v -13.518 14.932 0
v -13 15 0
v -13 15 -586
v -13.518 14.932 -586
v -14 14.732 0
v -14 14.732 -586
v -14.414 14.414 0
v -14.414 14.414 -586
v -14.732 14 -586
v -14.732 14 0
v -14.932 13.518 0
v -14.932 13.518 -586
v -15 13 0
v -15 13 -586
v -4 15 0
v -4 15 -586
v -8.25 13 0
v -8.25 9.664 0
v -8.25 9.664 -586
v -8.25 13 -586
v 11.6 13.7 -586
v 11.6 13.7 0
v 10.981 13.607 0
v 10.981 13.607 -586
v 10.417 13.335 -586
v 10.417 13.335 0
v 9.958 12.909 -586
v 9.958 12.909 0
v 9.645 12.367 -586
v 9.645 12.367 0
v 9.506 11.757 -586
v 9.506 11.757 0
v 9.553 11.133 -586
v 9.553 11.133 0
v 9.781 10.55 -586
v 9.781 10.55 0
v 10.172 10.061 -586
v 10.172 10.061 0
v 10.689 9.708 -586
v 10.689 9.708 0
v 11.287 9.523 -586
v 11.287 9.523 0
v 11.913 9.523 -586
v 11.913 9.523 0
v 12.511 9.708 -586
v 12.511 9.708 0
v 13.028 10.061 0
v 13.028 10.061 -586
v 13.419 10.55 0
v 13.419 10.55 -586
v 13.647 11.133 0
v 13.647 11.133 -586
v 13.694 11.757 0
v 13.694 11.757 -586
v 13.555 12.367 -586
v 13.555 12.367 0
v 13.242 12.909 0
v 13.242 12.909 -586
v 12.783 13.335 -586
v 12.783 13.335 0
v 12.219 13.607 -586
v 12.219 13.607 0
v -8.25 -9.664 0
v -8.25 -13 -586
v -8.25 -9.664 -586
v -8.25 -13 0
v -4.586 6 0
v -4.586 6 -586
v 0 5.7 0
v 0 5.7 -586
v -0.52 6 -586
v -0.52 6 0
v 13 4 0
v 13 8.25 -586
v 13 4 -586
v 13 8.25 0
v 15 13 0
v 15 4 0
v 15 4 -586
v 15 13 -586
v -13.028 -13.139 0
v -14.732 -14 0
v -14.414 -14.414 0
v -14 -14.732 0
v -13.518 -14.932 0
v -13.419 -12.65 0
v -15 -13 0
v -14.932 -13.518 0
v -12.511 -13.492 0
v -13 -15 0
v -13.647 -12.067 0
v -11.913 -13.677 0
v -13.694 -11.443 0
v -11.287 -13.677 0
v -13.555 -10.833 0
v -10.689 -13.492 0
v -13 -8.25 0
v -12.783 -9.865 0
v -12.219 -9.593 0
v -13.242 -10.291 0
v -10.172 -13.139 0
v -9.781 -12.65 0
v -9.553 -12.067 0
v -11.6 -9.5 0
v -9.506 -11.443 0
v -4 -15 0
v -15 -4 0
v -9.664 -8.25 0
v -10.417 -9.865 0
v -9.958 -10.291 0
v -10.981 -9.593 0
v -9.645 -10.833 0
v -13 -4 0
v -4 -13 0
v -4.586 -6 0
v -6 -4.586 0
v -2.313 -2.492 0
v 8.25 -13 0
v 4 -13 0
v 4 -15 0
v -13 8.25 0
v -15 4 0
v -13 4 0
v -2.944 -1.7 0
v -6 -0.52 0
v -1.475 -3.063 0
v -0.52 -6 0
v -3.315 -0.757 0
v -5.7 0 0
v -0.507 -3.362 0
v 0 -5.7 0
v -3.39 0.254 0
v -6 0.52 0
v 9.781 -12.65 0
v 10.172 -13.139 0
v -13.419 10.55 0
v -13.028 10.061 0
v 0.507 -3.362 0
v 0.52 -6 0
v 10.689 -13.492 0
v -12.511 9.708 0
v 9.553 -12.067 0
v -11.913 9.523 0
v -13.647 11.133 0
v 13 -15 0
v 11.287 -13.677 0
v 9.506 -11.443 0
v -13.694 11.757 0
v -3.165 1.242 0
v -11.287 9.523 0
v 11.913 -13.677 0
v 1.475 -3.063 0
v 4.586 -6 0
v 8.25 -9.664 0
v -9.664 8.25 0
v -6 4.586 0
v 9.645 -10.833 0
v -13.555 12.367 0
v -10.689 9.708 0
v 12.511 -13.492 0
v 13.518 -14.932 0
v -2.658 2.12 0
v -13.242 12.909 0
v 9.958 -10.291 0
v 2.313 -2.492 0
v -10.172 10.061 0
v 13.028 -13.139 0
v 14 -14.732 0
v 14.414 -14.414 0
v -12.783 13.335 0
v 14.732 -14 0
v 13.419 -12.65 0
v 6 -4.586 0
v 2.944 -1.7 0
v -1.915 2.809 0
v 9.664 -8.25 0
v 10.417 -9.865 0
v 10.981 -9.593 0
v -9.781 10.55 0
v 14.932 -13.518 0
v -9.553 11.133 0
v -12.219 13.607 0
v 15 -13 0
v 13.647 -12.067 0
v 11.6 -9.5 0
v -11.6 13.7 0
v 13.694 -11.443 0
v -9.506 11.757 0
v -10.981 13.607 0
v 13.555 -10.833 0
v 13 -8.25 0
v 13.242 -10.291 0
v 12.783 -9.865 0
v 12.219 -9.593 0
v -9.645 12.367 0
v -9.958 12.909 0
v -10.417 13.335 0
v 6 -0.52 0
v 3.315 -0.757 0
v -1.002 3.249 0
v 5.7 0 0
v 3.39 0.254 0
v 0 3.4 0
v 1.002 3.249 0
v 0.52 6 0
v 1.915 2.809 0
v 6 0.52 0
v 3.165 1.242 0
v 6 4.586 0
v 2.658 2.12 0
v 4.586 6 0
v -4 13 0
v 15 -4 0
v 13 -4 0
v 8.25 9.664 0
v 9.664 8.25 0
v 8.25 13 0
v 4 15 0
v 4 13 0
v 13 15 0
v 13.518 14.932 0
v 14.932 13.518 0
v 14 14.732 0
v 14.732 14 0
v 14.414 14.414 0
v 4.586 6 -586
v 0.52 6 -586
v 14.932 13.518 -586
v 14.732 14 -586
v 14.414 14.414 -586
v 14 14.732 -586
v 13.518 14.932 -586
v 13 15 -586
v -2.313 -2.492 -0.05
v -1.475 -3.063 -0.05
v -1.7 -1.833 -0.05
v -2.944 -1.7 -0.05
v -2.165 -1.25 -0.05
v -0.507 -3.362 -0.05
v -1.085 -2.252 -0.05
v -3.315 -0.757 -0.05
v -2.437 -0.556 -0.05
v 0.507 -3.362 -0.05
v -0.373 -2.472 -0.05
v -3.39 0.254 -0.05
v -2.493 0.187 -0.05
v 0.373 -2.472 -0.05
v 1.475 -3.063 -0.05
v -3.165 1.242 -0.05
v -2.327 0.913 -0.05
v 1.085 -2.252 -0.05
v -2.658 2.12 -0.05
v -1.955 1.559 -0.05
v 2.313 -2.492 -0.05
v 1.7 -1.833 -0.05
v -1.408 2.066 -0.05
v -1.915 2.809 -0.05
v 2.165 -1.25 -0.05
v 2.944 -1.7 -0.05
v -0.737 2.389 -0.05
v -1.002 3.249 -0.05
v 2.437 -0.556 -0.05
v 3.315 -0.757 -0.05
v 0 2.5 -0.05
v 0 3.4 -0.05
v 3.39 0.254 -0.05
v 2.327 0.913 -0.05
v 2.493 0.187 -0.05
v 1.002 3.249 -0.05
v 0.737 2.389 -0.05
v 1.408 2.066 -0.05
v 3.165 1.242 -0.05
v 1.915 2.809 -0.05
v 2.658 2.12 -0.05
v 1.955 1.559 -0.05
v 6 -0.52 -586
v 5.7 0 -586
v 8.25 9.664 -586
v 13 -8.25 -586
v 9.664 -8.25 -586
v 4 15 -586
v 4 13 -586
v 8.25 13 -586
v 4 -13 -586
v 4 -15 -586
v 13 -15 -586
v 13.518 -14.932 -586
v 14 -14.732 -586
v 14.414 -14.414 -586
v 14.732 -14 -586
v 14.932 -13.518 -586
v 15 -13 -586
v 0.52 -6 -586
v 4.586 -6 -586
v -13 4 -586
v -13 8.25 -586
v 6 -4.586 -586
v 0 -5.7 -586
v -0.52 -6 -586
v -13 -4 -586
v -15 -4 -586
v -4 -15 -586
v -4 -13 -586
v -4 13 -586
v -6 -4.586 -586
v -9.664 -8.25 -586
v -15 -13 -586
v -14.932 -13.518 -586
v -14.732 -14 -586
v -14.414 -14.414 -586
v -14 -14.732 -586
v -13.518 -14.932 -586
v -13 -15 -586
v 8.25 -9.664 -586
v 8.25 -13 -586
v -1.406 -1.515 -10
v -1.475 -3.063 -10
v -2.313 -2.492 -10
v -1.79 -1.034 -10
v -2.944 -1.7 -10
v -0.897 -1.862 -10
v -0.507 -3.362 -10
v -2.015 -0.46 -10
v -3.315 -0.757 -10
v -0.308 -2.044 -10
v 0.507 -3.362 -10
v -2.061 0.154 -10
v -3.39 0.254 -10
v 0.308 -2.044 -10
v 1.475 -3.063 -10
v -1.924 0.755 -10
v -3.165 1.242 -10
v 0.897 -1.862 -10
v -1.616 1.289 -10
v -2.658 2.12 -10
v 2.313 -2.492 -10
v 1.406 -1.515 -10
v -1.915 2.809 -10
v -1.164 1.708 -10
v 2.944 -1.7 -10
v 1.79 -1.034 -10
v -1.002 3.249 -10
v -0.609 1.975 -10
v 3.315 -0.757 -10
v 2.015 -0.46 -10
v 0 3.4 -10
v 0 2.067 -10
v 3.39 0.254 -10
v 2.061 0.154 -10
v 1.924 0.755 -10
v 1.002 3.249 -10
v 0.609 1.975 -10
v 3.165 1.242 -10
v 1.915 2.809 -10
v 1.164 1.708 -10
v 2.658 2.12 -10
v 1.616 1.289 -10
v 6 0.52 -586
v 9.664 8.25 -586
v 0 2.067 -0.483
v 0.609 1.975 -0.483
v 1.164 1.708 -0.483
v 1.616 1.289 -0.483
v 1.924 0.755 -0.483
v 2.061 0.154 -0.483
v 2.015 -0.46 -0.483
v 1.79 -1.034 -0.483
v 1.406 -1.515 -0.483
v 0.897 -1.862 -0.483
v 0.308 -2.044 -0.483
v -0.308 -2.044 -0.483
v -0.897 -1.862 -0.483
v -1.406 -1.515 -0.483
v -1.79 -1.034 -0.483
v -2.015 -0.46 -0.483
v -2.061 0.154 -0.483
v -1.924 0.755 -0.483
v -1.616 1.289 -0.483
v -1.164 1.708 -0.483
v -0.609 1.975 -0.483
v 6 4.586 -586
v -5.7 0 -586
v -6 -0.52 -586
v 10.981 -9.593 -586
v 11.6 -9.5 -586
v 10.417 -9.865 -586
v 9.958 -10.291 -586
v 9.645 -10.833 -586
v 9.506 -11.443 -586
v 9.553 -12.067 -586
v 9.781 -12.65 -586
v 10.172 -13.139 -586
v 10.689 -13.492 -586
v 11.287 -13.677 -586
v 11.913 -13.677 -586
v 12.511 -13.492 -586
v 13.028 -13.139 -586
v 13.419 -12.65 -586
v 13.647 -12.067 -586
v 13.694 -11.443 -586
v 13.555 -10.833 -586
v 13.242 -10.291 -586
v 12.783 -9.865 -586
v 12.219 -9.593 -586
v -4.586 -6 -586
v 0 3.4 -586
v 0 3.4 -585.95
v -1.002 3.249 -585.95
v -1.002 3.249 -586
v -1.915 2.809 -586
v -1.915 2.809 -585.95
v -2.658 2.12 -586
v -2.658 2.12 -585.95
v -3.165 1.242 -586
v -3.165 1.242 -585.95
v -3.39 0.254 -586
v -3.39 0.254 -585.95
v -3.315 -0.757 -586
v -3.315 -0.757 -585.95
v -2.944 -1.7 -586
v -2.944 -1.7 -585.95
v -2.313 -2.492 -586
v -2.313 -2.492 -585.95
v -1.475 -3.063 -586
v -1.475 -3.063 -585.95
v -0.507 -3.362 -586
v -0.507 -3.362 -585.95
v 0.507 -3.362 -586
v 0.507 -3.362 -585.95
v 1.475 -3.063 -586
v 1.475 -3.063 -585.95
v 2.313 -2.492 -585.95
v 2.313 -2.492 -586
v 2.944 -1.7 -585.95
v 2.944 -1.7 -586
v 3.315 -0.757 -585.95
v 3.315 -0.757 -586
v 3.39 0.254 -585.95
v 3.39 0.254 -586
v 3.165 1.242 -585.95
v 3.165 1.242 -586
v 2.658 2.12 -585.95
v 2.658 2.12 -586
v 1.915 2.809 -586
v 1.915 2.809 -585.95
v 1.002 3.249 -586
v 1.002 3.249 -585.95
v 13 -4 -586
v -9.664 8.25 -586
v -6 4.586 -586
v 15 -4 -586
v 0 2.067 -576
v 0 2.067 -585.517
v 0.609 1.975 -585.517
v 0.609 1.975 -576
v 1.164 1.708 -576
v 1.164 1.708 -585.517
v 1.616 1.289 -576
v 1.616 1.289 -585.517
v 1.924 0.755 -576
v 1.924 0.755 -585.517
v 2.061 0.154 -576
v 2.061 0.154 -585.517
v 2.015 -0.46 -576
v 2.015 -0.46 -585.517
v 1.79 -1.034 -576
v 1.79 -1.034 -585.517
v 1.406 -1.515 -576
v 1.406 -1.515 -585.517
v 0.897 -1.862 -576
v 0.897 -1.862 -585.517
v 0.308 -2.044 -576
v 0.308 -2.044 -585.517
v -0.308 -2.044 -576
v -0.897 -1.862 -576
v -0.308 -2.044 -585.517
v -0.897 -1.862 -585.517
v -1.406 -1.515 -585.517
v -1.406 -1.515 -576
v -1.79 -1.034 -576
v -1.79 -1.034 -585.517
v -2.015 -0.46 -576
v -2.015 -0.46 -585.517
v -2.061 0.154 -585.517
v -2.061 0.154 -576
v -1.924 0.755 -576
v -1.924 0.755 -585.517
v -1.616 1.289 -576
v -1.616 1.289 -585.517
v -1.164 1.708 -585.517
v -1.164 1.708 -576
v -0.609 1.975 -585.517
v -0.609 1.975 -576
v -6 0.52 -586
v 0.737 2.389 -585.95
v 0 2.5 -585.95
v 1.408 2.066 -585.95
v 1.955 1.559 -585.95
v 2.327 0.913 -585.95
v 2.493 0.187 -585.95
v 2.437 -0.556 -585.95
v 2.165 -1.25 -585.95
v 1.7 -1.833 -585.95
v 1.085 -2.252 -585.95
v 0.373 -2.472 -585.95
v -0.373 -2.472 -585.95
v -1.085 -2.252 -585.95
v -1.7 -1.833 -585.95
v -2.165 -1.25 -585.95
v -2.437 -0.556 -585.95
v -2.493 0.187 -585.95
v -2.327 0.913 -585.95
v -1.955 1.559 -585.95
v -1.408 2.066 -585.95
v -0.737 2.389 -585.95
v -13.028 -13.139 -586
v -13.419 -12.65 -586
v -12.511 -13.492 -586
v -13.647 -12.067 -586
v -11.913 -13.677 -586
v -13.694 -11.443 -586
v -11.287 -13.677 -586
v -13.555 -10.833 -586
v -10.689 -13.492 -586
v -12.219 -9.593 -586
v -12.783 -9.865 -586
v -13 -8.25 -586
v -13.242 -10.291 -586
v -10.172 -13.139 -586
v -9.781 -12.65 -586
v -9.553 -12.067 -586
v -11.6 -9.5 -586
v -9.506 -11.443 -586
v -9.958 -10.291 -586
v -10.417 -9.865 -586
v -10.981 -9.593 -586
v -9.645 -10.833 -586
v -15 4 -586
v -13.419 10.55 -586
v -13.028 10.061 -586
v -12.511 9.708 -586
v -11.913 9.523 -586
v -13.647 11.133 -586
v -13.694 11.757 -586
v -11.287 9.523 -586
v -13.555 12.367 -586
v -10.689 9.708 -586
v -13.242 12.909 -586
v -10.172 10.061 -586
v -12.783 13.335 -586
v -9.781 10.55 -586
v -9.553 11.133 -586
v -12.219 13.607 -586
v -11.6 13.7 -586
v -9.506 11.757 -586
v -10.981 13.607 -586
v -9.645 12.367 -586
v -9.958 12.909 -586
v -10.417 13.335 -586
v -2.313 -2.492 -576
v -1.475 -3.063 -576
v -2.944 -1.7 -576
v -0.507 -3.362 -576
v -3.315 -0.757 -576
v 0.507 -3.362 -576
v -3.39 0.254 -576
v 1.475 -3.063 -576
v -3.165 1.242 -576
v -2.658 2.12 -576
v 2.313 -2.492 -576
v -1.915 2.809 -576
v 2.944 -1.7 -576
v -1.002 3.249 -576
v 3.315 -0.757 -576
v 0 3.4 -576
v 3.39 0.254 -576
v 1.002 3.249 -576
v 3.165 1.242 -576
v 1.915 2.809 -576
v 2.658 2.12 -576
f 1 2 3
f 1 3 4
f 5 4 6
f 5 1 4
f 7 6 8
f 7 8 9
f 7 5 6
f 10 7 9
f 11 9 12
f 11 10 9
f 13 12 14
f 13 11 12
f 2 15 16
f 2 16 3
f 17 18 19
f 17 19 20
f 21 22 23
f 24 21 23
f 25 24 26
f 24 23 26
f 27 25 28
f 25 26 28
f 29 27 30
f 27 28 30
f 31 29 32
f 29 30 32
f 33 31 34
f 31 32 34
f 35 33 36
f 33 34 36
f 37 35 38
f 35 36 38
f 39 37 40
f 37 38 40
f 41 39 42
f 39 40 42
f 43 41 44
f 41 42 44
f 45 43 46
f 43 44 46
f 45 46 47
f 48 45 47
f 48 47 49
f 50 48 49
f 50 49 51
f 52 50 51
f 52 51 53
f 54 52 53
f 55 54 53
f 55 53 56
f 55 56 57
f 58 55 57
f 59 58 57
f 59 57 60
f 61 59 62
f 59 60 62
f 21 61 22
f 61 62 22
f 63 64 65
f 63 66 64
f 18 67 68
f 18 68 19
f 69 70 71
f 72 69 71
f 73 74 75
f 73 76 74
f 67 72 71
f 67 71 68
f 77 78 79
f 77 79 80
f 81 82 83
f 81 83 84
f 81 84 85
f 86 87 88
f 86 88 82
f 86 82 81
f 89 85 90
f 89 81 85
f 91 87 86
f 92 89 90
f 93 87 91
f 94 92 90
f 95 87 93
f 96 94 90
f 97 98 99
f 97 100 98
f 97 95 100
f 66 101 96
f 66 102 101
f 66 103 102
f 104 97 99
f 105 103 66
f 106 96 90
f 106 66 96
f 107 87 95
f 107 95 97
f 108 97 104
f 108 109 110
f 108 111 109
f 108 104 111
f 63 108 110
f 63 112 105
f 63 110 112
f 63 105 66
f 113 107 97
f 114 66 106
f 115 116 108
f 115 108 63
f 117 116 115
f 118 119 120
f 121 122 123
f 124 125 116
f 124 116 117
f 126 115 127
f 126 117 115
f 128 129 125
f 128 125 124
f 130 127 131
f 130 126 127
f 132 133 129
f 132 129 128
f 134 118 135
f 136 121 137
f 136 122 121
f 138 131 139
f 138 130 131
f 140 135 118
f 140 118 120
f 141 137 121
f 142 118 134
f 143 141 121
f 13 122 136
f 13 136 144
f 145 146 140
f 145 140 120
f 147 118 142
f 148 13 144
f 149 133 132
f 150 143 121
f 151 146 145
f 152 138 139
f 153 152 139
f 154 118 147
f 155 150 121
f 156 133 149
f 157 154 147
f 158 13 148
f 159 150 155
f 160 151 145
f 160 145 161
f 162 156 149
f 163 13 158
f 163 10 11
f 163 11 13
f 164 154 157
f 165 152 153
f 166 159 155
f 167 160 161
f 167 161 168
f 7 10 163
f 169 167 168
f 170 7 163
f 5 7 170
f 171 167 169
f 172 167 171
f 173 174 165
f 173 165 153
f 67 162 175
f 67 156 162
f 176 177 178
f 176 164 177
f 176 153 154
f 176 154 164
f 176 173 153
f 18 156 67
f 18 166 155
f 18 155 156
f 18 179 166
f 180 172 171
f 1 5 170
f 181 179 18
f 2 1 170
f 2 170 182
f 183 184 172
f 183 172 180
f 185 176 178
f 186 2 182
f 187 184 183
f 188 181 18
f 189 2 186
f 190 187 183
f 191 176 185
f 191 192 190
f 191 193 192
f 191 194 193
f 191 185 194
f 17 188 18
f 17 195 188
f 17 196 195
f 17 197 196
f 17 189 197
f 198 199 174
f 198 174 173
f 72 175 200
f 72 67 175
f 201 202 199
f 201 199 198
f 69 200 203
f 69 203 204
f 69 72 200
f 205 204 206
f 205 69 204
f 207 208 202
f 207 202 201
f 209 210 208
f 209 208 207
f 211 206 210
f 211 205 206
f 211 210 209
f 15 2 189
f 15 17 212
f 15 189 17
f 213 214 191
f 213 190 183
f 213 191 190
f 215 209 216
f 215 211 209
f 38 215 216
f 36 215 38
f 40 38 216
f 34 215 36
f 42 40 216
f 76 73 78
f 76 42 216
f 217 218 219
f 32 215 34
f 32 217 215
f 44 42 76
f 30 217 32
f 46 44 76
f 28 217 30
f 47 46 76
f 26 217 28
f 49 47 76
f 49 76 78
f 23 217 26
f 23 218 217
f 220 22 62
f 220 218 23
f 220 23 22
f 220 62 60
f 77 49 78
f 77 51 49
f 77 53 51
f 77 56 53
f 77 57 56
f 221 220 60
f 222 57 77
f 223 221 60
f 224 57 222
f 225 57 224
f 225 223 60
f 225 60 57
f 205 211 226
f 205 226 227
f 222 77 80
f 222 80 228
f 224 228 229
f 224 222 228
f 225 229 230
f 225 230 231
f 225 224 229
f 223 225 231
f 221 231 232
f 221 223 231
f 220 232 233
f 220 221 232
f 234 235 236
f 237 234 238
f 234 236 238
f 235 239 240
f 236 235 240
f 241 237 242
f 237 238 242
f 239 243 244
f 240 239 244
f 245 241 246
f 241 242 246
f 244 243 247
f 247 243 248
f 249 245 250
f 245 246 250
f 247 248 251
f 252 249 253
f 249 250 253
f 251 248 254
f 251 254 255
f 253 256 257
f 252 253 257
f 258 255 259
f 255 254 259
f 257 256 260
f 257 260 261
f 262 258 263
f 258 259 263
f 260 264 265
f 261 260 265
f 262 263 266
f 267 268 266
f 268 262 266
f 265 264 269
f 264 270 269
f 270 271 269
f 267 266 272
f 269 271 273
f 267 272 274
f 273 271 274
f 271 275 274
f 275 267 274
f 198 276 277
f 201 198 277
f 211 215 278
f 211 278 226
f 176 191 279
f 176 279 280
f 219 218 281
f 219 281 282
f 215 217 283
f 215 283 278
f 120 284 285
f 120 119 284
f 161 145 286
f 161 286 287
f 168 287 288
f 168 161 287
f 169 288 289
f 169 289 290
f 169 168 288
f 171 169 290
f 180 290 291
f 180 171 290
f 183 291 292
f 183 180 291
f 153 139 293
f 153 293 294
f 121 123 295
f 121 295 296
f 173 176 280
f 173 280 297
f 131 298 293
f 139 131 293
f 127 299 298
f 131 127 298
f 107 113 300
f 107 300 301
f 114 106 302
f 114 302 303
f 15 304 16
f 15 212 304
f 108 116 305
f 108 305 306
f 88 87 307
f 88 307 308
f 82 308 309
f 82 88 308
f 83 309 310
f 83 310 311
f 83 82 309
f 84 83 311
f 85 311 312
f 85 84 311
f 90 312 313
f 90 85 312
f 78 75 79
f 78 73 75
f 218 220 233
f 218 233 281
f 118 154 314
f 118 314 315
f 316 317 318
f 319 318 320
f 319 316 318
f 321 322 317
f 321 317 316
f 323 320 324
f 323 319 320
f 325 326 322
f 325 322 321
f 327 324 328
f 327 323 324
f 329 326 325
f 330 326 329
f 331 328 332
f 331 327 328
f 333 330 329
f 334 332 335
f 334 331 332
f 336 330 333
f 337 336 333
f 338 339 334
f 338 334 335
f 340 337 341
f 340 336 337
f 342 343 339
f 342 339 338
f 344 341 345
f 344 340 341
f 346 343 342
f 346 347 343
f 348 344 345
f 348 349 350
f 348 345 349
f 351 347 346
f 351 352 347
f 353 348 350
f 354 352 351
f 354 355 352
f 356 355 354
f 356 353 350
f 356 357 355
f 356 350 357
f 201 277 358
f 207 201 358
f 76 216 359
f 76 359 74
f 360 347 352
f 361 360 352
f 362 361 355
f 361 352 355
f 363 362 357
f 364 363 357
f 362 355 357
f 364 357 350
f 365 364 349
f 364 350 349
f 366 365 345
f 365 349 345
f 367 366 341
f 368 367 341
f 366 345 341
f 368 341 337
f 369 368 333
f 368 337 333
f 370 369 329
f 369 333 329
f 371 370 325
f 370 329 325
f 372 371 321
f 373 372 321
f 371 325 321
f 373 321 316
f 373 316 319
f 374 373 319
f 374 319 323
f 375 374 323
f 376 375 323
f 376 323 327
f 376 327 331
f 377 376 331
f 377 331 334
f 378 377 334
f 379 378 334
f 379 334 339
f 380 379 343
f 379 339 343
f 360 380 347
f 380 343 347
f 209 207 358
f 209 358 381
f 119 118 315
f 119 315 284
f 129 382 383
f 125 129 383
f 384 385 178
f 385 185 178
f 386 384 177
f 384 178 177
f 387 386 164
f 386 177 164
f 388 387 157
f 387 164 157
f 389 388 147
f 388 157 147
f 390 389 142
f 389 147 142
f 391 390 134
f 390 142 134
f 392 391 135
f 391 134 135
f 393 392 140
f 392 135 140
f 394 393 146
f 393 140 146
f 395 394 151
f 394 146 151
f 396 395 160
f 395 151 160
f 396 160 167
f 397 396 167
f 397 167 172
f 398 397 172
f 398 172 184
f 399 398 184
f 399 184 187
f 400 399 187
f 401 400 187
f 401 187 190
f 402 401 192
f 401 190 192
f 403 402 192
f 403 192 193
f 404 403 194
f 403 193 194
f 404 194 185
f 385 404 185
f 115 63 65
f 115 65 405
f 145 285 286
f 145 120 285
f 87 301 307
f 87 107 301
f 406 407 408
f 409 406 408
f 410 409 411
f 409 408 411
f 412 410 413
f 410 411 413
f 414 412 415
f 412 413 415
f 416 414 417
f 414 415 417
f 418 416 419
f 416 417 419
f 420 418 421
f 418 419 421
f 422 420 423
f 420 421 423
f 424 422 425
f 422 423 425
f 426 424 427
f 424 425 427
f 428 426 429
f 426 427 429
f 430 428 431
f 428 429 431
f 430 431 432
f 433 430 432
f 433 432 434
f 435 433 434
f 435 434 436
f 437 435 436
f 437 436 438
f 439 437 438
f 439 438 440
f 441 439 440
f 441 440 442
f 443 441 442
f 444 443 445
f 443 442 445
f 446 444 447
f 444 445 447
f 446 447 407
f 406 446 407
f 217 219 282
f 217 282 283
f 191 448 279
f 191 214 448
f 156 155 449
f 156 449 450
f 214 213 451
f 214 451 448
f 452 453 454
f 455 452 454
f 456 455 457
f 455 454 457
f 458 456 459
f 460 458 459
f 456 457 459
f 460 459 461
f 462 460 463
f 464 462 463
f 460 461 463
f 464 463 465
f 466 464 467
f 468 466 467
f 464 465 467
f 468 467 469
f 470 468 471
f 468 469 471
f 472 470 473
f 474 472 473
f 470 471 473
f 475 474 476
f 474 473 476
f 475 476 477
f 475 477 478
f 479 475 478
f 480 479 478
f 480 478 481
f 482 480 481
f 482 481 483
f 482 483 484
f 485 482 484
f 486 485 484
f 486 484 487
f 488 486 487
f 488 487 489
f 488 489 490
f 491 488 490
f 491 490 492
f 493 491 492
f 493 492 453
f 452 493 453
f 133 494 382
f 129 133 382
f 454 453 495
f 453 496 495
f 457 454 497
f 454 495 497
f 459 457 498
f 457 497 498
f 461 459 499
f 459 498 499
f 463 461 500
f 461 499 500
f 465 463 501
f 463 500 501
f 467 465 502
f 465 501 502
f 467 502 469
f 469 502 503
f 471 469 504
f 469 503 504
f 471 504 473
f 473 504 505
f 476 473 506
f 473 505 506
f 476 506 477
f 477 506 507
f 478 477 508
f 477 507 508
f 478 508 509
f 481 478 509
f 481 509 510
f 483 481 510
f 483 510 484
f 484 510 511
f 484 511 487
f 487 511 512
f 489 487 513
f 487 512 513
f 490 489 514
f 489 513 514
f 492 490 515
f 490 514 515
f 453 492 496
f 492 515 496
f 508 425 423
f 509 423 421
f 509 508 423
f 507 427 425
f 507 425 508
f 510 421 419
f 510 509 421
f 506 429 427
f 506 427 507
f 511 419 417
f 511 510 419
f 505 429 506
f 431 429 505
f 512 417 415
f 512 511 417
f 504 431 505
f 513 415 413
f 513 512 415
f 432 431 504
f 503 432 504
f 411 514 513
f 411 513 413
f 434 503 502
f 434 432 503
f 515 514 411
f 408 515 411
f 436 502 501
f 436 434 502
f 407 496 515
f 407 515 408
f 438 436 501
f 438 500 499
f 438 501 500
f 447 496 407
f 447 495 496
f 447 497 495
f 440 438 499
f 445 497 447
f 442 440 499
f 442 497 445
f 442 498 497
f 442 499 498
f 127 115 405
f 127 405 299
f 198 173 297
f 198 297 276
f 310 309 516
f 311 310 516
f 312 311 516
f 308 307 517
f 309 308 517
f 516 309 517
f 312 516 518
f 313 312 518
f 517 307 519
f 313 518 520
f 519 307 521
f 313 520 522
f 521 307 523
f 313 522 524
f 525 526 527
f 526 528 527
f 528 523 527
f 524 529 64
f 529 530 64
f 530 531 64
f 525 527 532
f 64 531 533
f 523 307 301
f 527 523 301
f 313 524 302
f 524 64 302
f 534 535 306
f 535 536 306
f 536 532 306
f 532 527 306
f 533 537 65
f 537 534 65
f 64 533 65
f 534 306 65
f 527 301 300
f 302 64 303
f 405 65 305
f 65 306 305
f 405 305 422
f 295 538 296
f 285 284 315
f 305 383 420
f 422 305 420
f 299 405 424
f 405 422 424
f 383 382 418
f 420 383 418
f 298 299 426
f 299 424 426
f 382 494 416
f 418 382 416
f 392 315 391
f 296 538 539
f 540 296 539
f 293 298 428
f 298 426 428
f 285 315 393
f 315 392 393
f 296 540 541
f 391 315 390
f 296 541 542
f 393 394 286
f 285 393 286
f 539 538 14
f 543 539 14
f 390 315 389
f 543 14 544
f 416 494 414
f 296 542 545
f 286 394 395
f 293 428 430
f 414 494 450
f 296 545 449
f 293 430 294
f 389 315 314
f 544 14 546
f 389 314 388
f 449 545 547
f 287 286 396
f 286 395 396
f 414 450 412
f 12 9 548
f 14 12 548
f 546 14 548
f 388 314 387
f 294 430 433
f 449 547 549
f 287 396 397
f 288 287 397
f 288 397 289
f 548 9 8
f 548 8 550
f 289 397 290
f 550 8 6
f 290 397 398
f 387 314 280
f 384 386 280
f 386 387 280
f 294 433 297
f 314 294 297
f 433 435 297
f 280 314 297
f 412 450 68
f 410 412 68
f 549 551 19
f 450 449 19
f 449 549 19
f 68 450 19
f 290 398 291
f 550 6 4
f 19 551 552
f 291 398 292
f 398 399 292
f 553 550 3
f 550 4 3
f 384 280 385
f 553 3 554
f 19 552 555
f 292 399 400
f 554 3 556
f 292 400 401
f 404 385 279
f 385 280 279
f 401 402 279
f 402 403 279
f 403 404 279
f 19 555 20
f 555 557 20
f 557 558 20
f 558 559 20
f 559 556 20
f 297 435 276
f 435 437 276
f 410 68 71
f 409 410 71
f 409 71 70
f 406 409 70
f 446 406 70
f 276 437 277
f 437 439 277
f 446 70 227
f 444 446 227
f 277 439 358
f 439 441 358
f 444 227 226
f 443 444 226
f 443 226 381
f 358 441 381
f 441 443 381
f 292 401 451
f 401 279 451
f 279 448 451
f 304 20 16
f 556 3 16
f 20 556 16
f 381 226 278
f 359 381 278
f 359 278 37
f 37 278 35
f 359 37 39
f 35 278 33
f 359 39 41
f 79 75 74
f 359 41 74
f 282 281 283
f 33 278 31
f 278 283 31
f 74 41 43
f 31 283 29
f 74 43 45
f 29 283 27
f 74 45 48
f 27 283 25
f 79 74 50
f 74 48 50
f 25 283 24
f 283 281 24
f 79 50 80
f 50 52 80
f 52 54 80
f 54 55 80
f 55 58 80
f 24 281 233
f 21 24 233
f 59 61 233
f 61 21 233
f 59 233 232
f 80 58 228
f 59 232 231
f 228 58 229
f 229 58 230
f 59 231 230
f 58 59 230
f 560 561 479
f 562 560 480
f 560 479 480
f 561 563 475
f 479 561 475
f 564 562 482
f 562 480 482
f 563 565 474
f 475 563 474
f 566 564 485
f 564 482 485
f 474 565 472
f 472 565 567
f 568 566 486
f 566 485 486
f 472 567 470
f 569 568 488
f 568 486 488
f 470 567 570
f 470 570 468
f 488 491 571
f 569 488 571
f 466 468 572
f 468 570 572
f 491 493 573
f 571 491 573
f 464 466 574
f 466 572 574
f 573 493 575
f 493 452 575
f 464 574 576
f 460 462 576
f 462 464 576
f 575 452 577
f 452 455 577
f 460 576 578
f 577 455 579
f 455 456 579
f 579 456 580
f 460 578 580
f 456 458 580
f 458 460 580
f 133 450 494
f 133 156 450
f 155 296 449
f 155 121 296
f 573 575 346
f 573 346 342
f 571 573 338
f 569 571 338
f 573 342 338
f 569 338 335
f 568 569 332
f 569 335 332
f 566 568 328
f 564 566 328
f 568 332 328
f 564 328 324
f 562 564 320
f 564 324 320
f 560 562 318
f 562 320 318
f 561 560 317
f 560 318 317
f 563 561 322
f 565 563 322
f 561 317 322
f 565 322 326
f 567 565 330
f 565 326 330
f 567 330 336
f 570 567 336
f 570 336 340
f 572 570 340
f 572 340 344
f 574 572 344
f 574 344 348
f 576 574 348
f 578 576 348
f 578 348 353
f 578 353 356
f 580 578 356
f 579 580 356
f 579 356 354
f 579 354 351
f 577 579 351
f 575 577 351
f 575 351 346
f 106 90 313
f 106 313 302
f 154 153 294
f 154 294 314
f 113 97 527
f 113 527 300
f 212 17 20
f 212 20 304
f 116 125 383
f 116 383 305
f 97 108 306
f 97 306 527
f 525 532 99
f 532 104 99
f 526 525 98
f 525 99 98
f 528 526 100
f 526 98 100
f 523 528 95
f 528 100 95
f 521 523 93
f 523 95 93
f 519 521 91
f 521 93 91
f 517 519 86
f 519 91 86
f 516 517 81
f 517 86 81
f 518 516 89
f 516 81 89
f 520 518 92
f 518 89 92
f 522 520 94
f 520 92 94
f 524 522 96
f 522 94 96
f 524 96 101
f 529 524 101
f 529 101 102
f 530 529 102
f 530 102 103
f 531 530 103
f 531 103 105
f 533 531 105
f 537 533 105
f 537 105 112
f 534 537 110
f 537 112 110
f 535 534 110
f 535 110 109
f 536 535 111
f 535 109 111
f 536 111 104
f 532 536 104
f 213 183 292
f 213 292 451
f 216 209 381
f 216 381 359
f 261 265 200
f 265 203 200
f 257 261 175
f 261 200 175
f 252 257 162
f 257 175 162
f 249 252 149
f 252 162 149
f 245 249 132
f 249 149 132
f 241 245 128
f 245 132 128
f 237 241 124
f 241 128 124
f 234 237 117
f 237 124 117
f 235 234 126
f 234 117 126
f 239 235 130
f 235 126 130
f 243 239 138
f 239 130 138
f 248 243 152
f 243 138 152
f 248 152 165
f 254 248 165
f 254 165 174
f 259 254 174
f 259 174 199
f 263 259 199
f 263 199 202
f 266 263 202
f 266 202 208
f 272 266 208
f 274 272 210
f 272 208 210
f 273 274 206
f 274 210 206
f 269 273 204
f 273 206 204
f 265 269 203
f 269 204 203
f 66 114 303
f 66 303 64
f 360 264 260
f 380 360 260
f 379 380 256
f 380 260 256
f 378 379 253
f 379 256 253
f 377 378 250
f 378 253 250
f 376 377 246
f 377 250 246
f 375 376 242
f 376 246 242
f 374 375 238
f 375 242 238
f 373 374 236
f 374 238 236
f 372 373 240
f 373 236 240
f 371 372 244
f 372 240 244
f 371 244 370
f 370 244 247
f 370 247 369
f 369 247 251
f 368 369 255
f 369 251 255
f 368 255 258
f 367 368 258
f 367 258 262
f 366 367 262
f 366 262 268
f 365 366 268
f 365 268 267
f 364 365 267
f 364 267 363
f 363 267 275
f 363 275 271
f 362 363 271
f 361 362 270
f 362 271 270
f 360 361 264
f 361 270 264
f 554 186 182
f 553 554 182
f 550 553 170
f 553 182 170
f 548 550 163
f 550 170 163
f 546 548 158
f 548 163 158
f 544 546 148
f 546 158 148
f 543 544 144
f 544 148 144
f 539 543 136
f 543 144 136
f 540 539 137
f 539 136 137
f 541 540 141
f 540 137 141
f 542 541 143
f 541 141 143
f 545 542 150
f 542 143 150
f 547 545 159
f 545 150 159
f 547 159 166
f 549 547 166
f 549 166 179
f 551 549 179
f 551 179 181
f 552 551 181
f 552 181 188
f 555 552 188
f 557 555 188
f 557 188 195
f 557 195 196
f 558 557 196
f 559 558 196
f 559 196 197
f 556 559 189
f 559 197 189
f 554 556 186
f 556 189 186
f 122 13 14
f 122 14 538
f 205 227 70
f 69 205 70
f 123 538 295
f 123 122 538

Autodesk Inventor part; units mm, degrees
sketch "Sketch_1" plane through (0, 0, 0) normal (0, 0, 1) x (1, 0, 0)
  line L0 (-15, -4) -> (-15, -13)
  arc A0 (-15, -13) -> (-13, -15) centre (-13, -13) ccw
  line L1 (-13, -15) -> (-4, -15)
  line L2 (-4, -15) -> (-4, -13)
  line L3 (-4, -13) -> (-8.25, -13)
  line L4 (-8.25, -13) -> (-8.25, -9.6642)
  line L5 (-8.25, -9.6642) -> (-4.5858, -6)
  line L6 (-4.5858, -6) -> (-0.5196, -6)
  line L7 (-0.5196, -6) -> (0, -5.7)
  line L8 (0, -5.7) -> (0.5196, -6)
  line L9 (0.5196, -6) -> (4.5858, -6)
  line L10 (4.5858, -6) -> (8.25, -9.6642)
  line L11 (8.25, -9.6642) -> (8.25, -13)
  line L12 (8.25, -13) -> (4, -13)
  line L13 (4, -13) -> (4, -15)
  line L14 (4, -15) -> (13, -15)
  arc A1 (13, -15) -> (15, -13) centre (13, -13) ccw
  line L15 (15, -13) -> (15, -4)
  line L16 (15, -4) -> (13, -4)
  line L17 (13, -4) -> (13, -8.25)
  line L18 (13, -8.25) -> (9.6642, -8.25)
  line L19 (9.6642, -8.25) -> (6, -4.5858)
  line L20 (6, -4.5858) -> (6, -0.5196)
  line L21 (6, -0.5196) -> (5.7, 0)
  line L22 (5.7, 0) -> (6, 0.5196)
  line L23 (6, 0.5196) -> (6, 4.5858)
  line L24 (6, 4.5858) -> (9.6642, 8.25)
  line L25 (9.6642, 8.25) -> (13, 8.25)
  line L26 (13, 8.25) -> (13, 4)
  line L27 (13, 4) -> (15, 4)
  line L28 (15, 4) -> (15, 13)
  arc A2 (15, 13) -> (13, 15) centre (13, 13) ccw
  line L29 (13, 15) -> (4, 15)
  line L30 (4, 15) -> (4, 13)
  line L31 (4, 13) -> (8.25, 13)
  line L32 (8.25, 13) -> (8.25, 9.6642)
  line L33 (8.25, 9.6642) -> (4.5858, 6)
  line L34 (4.5858, 6) -> (0.5196, 6)
  line L35 (0.5196, 6) -> (0, 5.7)
  line L36 (0, 5.7) -> (-0.5196, 6)
  line L37 (-0.5196, 6) -> (-4.5858, 6)
  line L38 (-4.5858, 6) -> (-8.25, 9.6642)
  line L39 (-8.25, 9.6642) -> (-8.25, 13)
  line L40 (-8.25, 13) -> (-4, 13)
  line L41 (-4, 13) -> (-4, 15)
  line L42 (-4, 15) -> (-13, 15)
  arc A3 (-13, 15) -> (-15, 13) centre (-13, 13) ccw
  line L43 (-15, 13) -> (-15, 4)
  line L44 (-15, 4) -> (-13, 4)
  line L45 (-13, 4) -> (-13, 8.25)
  line L46 (-13, 8.25) -> (-9.6642, 8.25)
  line L47 (-9.6642, 8.25) -> (-6, 4.5858)
  line L48 (-6, 4.5858) -> (-6, 0.5196)
  line L49 (-6, 0.5196) -> (-5.7, 0)
  line L50 (-5.7, 0) -> (-6, -0.5196)
  line L51 (-6, -0.5196) -> (-6, -4.5858)
  line L52 (-6, -4.5858) -> (-9.6642, -8.25)
  line L53 (-9.6642, -8.25) -> (-13, -8.25)
  line L54 (-13, -8.25) -> (-13, -4)
  line L55 (-13, -4) -> (-15, -4)
extrude "Extrusion1" add sketch "Sketch_1" against normal blind 586
sketch "Sketch2" plane through (0, 0, -586) normal (0, 0, -1) x (-1, 0, 0)
  point P0 (0, 0)
hole "Hole1" at (0, 0, -586) direction (0, 0, 1) diameter 6.8 depth 586
sketch "Sketch3" plane through (0, 0, -586) normal (0, 0, -1) x (-1, 0, 0)
  point P0 (-11.6, 11.6)
hole "Hole2" at (11.6, 11.6, -586) direction (0, 0, 1) diameter 4.2 depth 586
pattern_linear "Rectangular Pattern1" count 2 spacing 23.2 along (-1, 0, 0) count 2 spacing 23.2 along (0, -1, 0) of "Hole2"
sketch "Sketch_41" plane through (0, 0, 0) normal (1, 0, 0) x (0, 0, -1)
  line L0 (10, 0) -> (0.05, 0)
  line L1 (0.05, 2.5) -> (0.483, 2.067)
  line L2 (0.483, 2.067) -> (10, 2.067)
  line L3 (10, 2.067) -> (10, 3.45)
  line L4 (10, 3.45) -> (0.05, 3.45)
  line L5 (0.05, 3.45) -> (0.05, 2.5)
revolve "Revolution1" add sketch "Sketch_41" angle 360 about axis through (0, 0, -10) along (0, 0, -1)
thread "Thread1" size "M5x0.8" class "6H" standard "ISO Metric profile" full length
sketch "Sketch_42" plane through (0, 0, 0) normal (1, 0, 0) x (0, 0, -1)
  line L0 (585.95, 0) -> (576, 0)
  line L1 (576, 3.45) -> (576, 2.067)
  line L2 (576, 2.067) -> (585.517, 2.067)
  line L3 (585.517, 2.067) -> (585.95, 2.5)
  line L4 (585.95, 2.5) -> (585.95, 3.45)
  line L5 (585.95, 3.45) -> (576, 3.45)
revolve "Revolution2" add sketch "Sketch_42" angle 360 about axis through (0, 0, -585.95) along (0, 0, -1)
thread "Thread2" size "M5x0.8" class "6H" standard "ISO Metric profile" full length
ref_plane "C1_XY" through (0, 0, 0) normal (0, 0, 1) x (1, 0, 0)
ref_plane "C1_YZ" through (0, 0, 0) normal (1, 0, 0) x (0, 1, 0)
ref_plane "C1_ZX" through (0, 0, 0) normal (0, 1, 0) x (0, 0, 1)
ref_plane "to_frame_cap1_XY" through (0, 0, 0) normal (0, 0, 1) x (1, 0, 0)
ref_plane "to_frame_cap1_YZ" through (0, 0, 0) normal (1, 0, 0) x (0, 1, 0)
ref_plane "to_frame_cap1_ZX" through (0, 0, 0) normal (0, 1, 0) x (0, 0, 1)
ref_plane "to_frame_cap2_XY" through (0, 0, -586) normal (0, 0, -1) x (1, 0, 0)
ref_plane "to_frame_cap2_YZ" through (0, 0, -586) normal (1, 0, 0) x (0, -1, 0)
ref_plane "to_frame_cap2_ZX" through (0, 0, -586) normal (0, -1, 0) x (0, 0, -1)
properties part number "HFSB6-3030-586-HPW"
